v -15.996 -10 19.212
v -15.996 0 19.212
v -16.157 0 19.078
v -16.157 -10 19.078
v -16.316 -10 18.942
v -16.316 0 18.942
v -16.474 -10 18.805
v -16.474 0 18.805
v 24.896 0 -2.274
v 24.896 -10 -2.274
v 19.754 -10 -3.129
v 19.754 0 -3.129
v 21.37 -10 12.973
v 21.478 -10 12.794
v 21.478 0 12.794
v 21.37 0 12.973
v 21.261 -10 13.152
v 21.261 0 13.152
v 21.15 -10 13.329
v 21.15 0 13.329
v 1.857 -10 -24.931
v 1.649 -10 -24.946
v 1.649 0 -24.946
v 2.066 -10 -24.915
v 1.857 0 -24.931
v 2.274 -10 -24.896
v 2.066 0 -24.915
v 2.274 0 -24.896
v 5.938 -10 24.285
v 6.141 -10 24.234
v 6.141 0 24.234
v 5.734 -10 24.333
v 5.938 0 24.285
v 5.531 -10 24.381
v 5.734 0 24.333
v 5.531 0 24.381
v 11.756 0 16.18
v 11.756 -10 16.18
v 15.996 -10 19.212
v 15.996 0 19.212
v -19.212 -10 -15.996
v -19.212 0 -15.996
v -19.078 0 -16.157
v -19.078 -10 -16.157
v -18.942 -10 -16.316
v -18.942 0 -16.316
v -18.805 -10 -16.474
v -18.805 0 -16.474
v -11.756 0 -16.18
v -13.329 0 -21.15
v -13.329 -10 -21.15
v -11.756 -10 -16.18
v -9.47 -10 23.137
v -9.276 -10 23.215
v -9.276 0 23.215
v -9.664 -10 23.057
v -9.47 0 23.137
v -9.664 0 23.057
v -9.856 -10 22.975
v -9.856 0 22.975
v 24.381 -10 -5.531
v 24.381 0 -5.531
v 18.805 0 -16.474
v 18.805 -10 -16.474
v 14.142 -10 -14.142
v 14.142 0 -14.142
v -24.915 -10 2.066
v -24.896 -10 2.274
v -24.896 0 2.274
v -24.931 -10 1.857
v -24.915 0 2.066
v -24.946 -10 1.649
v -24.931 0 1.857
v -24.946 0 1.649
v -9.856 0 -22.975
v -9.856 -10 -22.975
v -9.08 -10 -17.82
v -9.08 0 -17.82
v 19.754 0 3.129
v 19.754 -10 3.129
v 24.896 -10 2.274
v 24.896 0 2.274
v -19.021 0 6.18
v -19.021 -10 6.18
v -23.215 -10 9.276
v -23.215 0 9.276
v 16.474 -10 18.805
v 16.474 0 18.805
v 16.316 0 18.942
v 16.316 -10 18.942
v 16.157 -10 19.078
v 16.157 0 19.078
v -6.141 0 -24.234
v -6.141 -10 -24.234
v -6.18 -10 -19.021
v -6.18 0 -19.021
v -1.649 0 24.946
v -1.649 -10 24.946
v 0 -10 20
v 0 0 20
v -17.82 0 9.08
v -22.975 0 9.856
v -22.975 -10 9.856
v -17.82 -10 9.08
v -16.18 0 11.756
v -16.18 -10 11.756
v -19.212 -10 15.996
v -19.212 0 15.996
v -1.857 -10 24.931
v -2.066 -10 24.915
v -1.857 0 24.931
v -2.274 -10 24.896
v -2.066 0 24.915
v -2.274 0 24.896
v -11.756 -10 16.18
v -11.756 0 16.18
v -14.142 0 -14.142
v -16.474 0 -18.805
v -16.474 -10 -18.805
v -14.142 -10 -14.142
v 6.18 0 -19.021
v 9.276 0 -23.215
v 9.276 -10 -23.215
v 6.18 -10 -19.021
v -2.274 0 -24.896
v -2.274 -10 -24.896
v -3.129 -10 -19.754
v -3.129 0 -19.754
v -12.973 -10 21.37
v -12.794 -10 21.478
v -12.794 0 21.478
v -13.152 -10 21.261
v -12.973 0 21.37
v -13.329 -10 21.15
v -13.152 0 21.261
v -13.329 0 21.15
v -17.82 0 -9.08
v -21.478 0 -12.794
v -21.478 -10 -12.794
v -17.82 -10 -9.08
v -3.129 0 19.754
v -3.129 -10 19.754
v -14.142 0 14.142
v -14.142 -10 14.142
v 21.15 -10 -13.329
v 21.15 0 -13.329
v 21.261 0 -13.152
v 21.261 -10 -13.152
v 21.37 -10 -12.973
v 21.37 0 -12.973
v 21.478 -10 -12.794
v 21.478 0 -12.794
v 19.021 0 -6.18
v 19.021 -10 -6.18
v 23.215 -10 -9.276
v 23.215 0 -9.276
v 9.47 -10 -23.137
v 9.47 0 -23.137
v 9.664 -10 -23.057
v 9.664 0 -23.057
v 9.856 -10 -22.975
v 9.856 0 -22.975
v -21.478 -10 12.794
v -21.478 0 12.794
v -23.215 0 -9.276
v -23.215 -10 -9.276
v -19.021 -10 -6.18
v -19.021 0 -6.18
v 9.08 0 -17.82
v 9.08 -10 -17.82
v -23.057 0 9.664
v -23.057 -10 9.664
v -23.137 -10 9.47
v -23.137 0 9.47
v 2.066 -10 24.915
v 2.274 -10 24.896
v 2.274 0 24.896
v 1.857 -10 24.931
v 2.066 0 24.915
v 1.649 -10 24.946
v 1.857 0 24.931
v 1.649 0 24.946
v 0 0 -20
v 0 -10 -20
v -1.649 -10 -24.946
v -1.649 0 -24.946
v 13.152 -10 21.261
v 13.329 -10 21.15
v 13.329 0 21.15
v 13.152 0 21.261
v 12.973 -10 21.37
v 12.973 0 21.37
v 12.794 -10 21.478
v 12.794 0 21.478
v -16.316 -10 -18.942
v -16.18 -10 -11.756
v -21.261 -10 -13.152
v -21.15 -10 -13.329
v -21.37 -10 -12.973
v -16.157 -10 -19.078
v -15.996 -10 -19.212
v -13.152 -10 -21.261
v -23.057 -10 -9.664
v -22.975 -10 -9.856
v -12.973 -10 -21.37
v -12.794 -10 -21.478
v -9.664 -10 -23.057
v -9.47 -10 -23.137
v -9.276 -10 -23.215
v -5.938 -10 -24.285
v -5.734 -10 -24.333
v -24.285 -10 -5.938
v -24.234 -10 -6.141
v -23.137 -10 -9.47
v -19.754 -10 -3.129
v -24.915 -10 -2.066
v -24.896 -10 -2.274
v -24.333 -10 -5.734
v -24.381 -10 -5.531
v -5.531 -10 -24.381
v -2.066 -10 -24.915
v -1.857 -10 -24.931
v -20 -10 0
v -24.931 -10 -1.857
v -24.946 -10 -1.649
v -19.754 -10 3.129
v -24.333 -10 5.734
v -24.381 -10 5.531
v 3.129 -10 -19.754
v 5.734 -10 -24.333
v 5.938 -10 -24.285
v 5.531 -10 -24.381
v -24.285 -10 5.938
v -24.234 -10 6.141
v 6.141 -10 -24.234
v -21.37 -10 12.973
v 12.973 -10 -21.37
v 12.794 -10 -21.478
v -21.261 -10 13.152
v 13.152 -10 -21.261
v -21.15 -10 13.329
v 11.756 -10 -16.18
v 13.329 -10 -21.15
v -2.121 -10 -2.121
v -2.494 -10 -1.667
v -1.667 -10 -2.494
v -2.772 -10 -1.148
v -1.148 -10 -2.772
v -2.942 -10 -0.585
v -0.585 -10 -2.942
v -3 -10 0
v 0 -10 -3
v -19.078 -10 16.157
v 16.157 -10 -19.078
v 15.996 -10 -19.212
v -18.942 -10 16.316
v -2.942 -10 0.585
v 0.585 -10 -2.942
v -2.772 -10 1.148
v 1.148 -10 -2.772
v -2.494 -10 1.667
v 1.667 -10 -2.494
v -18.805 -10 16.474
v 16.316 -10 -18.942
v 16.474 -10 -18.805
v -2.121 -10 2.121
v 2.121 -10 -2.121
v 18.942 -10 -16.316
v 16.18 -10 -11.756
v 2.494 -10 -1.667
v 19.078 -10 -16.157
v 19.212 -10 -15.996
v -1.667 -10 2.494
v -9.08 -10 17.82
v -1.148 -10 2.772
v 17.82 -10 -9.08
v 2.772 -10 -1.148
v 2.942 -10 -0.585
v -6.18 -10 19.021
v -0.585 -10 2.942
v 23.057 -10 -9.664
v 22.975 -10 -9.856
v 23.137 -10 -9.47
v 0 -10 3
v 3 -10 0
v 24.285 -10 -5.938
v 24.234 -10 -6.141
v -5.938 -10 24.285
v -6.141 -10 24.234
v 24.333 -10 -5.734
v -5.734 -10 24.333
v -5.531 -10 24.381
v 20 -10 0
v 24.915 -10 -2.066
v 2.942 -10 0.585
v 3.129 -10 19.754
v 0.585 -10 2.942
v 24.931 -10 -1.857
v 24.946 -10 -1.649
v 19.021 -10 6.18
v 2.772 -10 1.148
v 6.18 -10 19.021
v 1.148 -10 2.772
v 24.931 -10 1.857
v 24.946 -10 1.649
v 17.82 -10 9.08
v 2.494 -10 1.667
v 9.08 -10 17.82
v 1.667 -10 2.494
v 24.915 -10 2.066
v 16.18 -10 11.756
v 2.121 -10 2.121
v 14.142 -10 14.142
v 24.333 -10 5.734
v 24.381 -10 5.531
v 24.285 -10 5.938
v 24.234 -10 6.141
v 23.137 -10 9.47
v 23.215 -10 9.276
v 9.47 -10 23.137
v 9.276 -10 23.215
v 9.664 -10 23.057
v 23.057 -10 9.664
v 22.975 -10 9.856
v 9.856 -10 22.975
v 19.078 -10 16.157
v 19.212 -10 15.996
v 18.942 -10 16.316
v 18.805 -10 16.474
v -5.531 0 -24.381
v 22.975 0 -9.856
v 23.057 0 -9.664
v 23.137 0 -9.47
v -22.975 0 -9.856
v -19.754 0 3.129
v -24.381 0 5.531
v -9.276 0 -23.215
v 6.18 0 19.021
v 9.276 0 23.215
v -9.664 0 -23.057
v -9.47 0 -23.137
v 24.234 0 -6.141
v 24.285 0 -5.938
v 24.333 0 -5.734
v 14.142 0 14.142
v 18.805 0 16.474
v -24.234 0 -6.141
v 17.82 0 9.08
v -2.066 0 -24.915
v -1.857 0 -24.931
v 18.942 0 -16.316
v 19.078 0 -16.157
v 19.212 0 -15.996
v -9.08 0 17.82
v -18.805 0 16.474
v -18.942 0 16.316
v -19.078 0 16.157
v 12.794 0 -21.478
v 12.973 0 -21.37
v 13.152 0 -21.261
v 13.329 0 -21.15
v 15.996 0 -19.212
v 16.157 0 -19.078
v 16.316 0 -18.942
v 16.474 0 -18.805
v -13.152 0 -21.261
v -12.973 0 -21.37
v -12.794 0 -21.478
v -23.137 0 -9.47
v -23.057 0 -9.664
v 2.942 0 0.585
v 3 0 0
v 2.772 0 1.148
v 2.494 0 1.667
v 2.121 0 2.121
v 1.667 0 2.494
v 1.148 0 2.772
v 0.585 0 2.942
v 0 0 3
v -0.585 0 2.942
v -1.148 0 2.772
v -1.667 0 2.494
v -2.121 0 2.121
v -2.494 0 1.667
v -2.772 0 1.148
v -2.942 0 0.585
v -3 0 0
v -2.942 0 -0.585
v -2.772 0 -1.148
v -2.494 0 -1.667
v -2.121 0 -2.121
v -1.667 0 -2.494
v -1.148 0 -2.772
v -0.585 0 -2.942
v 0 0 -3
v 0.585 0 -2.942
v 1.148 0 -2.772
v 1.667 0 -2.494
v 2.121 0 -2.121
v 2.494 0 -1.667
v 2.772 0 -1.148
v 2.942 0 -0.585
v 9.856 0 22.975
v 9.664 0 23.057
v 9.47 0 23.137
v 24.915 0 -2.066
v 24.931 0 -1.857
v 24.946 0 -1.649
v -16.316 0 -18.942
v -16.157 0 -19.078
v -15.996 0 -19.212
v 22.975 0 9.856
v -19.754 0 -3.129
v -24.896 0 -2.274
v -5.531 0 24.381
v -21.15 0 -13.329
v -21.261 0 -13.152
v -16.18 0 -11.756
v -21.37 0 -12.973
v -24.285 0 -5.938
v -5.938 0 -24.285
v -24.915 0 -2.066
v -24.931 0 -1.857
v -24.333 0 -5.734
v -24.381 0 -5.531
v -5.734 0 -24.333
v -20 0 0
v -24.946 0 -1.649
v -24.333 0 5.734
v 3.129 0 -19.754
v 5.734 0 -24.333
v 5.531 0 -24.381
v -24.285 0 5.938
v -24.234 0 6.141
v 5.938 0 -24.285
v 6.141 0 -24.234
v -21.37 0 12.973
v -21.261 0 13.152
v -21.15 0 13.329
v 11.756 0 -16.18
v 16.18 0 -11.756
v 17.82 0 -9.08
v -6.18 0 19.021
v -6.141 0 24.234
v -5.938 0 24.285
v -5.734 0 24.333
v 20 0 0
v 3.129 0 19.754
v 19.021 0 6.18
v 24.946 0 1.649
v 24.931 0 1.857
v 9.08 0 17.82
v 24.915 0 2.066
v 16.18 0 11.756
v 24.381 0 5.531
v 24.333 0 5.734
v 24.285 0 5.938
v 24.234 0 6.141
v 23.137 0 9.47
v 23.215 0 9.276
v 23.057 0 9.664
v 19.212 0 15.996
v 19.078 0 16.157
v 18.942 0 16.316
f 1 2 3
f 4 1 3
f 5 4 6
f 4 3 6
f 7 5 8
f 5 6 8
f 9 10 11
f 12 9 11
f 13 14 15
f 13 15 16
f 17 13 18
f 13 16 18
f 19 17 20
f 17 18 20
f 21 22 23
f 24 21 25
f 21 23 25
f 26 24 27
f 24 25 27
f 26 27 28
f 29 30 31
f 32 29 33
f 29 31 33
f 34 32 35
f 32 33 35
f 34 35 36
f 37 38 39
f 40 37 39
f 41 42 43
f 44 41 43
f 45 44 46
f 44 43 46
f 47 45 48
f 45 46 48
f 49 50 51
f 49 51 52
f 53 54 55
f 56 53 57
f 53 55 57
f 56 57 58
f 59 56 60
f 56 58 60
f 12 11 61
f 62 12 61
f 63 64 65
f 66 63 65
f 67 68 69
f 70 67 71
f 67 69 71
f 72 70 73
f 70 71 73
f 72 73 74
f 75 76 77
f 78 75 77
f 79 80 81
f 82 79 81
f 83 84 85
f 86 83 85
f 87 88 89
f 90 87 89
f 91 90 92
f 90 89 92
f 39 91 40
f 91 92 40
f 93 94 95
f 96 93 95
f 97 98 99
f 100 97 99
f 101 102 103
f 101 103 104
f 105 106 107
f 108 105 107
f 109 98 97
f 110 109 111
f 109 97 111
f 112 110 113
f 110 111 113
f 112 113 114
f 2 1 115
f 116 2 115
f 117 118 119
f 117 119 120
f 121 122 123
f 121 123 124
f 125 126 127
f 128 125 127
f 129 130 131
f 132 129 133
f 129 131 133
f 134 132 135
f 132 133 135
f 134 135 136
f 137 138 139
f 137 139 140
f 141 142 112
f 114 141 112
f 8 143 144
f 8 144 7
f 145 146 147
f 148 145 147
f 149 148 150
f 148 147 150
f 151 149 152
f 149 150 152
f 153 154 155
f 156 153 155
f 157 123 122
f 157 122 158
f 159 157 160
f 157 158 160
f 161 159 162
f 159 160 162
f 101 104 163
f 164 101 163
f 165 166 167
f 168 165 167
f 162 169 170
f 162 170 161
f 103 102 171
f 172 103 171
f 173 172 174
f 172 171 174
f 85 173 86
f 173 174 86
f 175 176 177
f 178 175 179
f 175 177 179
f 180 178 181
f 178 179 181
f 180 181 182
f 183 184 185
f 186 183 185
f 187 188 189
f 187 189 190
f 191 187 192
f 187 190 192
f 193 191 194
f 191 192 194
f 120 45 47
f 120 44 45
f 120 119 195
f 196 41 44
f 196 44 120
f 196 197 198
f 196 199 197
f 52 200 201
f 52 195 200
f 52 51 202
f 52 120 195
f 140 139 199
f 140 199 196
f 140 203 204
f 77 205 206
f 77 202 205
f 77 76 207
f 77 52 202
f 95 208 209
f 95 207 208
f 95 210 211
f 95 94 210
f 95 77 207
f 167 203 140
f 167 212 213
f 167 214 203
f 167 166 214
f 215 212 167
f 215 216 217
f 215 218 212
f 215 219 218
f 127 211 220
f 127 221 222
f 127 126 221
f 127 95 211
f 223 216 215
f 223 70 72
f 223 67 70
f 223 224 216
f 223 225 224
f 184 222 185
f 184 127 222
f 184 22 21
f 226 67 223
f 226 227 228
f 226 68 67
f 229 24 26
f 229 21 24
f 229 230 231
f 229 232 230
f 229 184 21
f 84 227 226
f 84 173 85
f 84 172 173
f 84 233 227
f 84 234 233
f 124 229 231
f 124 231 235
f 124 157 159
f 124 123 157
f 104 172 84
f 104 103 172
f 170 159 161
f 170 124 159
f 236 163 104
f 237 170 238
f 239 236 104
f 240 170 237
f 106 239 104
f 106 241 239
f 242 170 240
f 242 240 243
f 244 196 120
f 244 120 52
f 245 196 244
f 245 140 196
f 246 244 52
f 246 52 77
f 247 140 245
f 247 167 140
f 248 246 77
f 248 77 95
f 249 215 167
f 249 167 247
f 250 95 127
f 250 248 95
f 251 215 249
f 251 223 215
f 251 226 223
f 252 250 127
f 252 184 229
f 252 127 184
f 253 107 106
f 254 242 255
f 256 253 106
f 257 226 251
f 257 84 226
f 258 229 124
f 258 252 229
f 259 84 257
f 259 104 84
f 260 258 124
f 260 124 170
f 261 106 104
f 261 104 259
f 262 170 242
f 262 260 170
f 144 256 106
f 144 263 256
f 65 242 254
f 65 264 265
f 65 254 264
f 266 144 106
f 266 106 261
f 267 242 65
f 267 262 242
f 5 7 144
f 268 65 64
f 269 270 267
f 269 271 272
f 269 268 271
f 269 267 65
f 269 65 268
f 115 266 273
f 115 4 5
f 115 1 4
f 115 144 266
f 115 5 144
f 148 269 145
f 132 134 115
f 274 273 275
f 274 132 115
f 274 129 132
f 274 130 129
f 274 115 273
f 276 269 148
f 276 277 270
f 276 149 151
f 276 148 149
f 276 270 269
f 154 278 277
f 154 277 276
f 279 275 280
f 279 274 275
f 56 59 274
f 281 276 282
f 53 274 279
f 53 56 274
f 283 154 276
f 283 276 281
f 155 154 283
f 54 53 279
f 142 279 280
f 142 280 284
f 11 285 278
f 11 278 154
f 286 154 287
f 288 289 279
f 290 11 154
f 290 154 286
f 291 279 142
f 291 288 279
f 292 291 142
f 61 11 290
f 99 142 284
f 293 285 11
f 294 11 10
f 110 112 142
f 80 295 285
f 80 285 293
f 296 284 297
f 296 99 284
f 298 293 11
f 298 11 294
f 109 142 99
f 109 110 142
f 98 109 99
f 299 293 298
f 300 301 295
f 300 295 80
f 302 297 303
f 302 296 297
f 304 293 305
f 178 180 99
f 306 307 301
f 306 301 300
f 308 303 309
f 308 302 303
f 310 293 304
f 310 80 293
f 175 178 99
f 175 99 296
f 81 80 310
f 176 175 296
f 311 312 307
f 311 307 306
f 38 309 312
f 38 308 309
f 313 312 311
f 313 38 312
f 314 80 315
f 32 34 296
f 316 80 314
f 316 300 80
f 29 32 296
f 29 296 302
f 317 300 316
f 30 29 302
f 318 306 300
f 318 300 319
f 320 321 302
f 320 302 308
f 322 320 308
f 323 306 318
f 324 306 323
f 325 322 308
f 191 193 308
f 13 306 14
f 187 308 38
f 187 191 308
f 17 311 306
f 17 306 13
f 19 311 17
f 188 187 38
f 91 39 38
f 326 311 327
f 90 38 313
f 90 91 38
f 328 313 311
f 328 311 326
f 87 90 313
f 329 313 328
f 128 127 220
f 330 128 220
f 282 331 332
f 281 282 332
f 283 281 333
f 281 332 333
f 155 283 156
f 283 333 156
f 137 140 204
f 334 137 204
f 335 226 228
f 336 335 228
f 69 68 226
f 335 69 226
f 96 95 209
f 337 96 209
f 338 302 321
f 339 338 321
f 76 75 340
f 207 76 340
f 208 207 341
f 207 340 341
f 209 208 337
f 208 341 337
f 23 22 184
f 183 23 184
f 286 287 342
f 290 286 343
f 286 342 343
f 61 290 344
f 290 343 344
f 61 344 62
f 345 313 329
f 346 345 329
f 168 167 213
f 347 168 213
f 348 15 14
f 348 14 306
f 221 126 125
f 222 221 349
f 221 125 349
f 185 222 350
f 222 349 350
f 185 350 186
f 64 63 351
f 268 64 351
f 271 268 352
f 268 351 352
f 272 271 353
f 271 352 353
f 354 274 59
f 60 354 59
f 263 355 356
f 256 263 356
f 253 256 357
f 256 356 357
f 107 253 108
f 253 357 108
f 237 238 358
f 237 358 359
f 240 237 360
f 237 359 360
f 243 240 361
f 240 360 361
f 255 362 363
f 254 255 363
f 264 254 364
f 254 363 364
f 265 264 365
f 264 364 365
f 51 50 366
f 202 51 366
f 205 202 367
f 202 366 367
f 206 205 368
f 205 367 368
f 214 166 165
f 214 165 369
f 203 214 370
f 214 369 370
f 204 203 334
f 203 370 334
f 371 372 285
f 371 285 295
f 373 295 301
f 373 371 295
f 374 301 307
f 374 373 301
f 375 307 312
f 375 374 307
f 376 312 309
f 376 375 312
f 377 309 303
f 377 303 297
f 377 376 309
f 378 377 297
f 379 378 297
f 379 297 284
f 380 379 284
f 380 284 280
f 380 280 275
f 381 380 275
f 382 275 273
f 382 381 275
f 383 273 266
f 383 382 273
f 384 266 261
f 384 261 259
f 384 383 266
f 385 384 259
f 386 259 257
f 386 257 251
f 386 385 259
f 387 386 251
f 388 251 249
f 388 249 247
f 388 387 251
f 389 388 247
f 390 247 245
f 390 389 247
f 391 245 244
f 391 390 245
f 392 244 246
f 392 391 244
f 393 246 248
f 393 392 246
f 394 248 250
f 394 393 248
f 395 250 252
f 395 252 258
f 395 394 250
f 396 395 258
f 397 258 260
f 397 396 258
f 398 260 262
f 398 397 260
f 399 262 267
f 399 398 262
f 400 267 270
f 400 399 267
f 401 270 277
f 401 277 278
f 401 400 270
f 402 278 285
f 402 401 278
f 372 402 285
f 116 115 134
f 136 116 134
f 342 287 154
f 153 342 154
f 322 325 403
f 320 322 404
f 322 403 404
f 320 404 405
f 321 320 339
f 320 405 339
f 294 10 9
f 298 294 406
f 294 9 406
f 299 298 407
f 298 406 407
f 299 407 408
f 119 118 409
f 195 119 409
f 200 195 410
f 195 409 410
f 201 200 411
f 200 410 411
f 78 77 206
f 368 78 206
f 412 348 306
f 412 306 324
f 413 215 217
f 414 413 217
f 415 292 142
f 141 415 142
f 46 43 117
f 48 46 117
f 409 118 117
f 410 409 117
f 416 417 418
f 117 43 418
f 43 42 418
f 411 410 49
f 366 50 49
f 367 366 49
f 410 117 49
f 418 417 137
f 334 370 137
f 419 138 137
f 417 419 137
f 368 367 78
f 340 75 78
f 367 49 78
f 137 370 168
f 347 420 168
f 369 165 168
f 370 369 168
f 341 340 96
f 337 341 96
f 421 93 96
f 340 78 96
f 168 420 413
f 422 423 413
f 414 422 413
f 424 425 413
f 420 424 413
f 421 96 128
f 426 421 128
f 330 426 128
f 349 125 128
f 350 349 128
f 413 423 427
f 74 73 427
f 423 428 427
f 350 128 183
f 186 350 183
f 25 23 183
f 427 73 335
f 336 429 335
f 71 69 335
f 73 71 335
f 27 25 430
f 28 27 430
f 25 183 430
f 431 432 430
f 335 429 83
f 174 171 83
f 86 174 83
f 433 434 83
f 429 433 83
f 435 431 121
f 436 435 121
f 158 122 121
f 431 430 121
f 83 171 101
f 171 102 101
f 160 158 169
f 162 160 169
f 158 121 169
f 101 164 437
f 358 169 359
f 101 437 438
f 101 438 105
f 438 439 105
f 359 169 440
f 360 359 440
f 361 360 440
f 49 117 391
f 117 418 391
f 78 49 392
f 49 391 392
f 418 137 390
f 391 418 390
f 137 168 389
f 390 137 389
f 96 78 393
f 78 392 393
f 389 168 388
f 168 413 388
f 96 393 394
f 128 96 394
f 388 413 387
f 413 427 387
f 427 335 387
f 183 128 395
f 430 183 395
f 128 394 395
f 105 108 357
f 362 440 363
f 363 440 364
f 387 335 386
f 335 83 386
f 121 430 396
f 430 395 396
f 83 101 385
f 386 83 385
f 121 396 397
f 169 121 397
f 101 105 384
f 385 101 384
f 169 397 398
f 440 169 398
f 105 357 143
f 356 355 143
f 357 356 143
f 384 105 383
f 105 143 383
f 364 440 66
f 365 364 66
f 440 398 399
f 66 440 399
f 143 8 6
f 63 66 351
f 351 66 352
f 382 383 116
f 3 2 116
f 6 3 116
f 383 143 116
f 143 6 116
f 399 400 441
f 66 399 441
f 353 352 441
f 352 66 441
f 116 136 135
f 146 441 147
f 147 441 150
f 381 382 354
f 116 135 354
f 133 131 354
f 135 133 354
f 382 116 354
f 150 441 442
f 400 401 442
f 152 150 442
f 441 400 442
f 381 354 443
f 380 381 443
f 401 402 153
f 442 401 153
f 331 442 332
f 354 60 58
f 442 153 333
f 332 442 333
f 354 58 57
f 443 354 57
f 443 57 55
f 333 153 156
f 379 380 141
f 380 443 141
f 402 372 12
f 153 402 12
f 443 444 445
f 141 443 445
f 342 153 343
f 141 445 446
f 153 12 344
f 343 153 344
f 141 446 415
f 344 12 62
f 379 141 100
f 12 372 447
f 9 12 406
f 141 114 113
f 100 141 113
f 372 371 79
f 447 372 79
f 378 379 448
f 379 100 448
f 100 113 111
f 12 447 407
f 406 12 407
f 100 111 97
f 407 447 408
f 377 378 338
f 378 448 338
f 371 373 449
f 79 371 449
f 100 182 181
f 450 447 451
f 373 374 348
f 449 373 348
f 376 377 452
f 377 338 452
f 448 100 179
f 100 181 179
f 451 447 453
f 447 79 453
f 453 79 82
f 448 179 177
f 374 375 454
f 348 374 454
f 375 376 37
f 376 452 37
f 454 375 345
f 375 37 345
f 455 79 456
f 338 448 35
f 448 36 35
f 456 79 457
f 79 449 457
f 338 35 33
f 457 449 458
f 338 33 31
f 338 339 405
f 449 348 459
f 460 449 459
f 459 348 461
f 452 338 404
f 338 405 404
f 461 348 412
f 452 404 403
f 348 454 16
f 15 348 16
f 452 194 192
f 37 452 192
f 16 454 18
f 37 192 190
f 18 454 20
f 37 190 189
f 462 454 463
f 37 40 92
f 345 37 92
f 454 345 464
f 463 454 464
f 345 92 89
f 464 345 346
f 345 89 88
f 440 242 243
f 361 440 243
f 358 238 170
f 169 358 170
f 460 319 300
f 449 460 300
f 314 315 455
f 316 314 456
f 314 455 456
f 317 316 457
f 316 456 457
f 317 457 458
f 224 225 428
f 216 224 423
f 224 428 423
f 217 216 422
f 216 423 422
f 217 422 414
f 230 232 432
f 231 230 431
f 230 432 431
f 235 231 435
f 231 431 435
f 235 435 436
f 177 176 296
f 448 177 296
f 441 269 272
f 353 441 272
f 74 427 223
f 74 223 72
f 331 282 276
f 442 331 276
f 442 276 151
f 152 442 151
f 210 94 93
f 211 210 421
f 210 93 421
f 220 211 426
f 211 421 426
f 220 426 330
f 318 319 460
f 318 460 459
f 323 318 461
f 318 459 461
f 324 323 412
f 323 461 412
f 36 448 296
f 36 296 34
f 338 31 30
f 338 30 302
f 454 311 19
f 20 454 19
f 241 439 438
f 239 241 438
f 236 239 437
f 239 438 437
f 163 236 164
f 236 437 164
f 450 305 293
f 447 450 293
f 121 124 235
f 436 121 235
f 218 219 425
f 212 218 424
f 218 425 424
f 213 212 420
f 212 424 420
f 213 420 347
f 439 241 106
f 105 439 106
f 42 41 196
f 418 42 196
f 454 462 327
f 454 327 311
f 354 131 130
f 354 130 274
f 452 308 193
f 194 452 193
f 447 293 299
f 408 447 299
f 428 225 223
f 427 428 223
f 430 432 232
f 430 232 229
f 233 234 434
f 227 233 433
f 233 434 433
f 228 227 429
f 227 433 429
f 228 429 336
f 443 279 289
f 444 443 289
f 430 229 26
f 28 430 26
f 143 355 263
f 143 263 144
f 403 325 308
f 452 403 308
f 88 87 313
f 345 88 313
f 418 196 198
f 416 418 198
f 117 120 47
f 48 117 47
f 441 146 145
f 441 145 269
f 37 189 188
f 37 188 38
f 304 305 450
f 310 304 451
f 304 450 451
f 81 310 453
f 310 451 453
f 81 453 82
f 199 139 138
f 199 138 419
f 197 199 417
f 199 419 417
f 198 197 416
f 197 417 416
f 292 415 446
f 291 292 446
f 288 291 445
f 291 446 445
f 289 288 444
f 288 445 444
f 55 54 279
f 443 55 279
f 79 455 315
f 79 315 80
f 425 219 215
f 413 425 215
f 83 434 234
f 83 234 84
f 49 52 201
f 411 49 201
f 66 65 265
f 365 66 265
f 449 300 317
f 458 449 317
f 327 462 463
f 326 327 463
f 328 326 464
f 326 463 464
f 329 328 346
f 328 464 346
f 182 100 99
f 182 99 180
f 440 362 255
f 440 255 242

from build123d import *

# Parameters (mm, degrees)
F0_R            = 25
F0_R_2          = 3
F1_DEPTH        = 10
F3_DEPTH        = 25
F3_COPIES_COUNT = 40


# Not quite as in the source:
# - a pattern or mirror of a feature is missing from the dataset's text; its kind, count and spacing are read off the source's solid


with BuildPart() as f1:
    # F0 (on Front) → F1 (new body)
    with BuildSketch(Plane.XZ):
        Circle(F0_R)
        Circle(F0_R_2, mode=Mode.SUBTRACT)
    extrude(amount=F1_DEPTH)

    # F2 (on face) → F3 (cut)
    with BuildSketch(Plane.XZ.offset(10)):
        Polygon((2, 26), (-2, 26), (0, 20), align=None)
    f3 = extrude(amount=-F3_DEPTH, mode=Mode.SUBTRACT)

    # F3_copies: F3 ×40 about axis
    f3_copies_axis = Axis((0, 0, 0), (0, 1, 0))
    for i in range(1, F3_COPIES_COUNT):
        add(f3.rotate(f3_copies_axis, i * 360 / F3_COPIES_COUNT), mode=Mode.SUBTRACT)


solid = f1.part
